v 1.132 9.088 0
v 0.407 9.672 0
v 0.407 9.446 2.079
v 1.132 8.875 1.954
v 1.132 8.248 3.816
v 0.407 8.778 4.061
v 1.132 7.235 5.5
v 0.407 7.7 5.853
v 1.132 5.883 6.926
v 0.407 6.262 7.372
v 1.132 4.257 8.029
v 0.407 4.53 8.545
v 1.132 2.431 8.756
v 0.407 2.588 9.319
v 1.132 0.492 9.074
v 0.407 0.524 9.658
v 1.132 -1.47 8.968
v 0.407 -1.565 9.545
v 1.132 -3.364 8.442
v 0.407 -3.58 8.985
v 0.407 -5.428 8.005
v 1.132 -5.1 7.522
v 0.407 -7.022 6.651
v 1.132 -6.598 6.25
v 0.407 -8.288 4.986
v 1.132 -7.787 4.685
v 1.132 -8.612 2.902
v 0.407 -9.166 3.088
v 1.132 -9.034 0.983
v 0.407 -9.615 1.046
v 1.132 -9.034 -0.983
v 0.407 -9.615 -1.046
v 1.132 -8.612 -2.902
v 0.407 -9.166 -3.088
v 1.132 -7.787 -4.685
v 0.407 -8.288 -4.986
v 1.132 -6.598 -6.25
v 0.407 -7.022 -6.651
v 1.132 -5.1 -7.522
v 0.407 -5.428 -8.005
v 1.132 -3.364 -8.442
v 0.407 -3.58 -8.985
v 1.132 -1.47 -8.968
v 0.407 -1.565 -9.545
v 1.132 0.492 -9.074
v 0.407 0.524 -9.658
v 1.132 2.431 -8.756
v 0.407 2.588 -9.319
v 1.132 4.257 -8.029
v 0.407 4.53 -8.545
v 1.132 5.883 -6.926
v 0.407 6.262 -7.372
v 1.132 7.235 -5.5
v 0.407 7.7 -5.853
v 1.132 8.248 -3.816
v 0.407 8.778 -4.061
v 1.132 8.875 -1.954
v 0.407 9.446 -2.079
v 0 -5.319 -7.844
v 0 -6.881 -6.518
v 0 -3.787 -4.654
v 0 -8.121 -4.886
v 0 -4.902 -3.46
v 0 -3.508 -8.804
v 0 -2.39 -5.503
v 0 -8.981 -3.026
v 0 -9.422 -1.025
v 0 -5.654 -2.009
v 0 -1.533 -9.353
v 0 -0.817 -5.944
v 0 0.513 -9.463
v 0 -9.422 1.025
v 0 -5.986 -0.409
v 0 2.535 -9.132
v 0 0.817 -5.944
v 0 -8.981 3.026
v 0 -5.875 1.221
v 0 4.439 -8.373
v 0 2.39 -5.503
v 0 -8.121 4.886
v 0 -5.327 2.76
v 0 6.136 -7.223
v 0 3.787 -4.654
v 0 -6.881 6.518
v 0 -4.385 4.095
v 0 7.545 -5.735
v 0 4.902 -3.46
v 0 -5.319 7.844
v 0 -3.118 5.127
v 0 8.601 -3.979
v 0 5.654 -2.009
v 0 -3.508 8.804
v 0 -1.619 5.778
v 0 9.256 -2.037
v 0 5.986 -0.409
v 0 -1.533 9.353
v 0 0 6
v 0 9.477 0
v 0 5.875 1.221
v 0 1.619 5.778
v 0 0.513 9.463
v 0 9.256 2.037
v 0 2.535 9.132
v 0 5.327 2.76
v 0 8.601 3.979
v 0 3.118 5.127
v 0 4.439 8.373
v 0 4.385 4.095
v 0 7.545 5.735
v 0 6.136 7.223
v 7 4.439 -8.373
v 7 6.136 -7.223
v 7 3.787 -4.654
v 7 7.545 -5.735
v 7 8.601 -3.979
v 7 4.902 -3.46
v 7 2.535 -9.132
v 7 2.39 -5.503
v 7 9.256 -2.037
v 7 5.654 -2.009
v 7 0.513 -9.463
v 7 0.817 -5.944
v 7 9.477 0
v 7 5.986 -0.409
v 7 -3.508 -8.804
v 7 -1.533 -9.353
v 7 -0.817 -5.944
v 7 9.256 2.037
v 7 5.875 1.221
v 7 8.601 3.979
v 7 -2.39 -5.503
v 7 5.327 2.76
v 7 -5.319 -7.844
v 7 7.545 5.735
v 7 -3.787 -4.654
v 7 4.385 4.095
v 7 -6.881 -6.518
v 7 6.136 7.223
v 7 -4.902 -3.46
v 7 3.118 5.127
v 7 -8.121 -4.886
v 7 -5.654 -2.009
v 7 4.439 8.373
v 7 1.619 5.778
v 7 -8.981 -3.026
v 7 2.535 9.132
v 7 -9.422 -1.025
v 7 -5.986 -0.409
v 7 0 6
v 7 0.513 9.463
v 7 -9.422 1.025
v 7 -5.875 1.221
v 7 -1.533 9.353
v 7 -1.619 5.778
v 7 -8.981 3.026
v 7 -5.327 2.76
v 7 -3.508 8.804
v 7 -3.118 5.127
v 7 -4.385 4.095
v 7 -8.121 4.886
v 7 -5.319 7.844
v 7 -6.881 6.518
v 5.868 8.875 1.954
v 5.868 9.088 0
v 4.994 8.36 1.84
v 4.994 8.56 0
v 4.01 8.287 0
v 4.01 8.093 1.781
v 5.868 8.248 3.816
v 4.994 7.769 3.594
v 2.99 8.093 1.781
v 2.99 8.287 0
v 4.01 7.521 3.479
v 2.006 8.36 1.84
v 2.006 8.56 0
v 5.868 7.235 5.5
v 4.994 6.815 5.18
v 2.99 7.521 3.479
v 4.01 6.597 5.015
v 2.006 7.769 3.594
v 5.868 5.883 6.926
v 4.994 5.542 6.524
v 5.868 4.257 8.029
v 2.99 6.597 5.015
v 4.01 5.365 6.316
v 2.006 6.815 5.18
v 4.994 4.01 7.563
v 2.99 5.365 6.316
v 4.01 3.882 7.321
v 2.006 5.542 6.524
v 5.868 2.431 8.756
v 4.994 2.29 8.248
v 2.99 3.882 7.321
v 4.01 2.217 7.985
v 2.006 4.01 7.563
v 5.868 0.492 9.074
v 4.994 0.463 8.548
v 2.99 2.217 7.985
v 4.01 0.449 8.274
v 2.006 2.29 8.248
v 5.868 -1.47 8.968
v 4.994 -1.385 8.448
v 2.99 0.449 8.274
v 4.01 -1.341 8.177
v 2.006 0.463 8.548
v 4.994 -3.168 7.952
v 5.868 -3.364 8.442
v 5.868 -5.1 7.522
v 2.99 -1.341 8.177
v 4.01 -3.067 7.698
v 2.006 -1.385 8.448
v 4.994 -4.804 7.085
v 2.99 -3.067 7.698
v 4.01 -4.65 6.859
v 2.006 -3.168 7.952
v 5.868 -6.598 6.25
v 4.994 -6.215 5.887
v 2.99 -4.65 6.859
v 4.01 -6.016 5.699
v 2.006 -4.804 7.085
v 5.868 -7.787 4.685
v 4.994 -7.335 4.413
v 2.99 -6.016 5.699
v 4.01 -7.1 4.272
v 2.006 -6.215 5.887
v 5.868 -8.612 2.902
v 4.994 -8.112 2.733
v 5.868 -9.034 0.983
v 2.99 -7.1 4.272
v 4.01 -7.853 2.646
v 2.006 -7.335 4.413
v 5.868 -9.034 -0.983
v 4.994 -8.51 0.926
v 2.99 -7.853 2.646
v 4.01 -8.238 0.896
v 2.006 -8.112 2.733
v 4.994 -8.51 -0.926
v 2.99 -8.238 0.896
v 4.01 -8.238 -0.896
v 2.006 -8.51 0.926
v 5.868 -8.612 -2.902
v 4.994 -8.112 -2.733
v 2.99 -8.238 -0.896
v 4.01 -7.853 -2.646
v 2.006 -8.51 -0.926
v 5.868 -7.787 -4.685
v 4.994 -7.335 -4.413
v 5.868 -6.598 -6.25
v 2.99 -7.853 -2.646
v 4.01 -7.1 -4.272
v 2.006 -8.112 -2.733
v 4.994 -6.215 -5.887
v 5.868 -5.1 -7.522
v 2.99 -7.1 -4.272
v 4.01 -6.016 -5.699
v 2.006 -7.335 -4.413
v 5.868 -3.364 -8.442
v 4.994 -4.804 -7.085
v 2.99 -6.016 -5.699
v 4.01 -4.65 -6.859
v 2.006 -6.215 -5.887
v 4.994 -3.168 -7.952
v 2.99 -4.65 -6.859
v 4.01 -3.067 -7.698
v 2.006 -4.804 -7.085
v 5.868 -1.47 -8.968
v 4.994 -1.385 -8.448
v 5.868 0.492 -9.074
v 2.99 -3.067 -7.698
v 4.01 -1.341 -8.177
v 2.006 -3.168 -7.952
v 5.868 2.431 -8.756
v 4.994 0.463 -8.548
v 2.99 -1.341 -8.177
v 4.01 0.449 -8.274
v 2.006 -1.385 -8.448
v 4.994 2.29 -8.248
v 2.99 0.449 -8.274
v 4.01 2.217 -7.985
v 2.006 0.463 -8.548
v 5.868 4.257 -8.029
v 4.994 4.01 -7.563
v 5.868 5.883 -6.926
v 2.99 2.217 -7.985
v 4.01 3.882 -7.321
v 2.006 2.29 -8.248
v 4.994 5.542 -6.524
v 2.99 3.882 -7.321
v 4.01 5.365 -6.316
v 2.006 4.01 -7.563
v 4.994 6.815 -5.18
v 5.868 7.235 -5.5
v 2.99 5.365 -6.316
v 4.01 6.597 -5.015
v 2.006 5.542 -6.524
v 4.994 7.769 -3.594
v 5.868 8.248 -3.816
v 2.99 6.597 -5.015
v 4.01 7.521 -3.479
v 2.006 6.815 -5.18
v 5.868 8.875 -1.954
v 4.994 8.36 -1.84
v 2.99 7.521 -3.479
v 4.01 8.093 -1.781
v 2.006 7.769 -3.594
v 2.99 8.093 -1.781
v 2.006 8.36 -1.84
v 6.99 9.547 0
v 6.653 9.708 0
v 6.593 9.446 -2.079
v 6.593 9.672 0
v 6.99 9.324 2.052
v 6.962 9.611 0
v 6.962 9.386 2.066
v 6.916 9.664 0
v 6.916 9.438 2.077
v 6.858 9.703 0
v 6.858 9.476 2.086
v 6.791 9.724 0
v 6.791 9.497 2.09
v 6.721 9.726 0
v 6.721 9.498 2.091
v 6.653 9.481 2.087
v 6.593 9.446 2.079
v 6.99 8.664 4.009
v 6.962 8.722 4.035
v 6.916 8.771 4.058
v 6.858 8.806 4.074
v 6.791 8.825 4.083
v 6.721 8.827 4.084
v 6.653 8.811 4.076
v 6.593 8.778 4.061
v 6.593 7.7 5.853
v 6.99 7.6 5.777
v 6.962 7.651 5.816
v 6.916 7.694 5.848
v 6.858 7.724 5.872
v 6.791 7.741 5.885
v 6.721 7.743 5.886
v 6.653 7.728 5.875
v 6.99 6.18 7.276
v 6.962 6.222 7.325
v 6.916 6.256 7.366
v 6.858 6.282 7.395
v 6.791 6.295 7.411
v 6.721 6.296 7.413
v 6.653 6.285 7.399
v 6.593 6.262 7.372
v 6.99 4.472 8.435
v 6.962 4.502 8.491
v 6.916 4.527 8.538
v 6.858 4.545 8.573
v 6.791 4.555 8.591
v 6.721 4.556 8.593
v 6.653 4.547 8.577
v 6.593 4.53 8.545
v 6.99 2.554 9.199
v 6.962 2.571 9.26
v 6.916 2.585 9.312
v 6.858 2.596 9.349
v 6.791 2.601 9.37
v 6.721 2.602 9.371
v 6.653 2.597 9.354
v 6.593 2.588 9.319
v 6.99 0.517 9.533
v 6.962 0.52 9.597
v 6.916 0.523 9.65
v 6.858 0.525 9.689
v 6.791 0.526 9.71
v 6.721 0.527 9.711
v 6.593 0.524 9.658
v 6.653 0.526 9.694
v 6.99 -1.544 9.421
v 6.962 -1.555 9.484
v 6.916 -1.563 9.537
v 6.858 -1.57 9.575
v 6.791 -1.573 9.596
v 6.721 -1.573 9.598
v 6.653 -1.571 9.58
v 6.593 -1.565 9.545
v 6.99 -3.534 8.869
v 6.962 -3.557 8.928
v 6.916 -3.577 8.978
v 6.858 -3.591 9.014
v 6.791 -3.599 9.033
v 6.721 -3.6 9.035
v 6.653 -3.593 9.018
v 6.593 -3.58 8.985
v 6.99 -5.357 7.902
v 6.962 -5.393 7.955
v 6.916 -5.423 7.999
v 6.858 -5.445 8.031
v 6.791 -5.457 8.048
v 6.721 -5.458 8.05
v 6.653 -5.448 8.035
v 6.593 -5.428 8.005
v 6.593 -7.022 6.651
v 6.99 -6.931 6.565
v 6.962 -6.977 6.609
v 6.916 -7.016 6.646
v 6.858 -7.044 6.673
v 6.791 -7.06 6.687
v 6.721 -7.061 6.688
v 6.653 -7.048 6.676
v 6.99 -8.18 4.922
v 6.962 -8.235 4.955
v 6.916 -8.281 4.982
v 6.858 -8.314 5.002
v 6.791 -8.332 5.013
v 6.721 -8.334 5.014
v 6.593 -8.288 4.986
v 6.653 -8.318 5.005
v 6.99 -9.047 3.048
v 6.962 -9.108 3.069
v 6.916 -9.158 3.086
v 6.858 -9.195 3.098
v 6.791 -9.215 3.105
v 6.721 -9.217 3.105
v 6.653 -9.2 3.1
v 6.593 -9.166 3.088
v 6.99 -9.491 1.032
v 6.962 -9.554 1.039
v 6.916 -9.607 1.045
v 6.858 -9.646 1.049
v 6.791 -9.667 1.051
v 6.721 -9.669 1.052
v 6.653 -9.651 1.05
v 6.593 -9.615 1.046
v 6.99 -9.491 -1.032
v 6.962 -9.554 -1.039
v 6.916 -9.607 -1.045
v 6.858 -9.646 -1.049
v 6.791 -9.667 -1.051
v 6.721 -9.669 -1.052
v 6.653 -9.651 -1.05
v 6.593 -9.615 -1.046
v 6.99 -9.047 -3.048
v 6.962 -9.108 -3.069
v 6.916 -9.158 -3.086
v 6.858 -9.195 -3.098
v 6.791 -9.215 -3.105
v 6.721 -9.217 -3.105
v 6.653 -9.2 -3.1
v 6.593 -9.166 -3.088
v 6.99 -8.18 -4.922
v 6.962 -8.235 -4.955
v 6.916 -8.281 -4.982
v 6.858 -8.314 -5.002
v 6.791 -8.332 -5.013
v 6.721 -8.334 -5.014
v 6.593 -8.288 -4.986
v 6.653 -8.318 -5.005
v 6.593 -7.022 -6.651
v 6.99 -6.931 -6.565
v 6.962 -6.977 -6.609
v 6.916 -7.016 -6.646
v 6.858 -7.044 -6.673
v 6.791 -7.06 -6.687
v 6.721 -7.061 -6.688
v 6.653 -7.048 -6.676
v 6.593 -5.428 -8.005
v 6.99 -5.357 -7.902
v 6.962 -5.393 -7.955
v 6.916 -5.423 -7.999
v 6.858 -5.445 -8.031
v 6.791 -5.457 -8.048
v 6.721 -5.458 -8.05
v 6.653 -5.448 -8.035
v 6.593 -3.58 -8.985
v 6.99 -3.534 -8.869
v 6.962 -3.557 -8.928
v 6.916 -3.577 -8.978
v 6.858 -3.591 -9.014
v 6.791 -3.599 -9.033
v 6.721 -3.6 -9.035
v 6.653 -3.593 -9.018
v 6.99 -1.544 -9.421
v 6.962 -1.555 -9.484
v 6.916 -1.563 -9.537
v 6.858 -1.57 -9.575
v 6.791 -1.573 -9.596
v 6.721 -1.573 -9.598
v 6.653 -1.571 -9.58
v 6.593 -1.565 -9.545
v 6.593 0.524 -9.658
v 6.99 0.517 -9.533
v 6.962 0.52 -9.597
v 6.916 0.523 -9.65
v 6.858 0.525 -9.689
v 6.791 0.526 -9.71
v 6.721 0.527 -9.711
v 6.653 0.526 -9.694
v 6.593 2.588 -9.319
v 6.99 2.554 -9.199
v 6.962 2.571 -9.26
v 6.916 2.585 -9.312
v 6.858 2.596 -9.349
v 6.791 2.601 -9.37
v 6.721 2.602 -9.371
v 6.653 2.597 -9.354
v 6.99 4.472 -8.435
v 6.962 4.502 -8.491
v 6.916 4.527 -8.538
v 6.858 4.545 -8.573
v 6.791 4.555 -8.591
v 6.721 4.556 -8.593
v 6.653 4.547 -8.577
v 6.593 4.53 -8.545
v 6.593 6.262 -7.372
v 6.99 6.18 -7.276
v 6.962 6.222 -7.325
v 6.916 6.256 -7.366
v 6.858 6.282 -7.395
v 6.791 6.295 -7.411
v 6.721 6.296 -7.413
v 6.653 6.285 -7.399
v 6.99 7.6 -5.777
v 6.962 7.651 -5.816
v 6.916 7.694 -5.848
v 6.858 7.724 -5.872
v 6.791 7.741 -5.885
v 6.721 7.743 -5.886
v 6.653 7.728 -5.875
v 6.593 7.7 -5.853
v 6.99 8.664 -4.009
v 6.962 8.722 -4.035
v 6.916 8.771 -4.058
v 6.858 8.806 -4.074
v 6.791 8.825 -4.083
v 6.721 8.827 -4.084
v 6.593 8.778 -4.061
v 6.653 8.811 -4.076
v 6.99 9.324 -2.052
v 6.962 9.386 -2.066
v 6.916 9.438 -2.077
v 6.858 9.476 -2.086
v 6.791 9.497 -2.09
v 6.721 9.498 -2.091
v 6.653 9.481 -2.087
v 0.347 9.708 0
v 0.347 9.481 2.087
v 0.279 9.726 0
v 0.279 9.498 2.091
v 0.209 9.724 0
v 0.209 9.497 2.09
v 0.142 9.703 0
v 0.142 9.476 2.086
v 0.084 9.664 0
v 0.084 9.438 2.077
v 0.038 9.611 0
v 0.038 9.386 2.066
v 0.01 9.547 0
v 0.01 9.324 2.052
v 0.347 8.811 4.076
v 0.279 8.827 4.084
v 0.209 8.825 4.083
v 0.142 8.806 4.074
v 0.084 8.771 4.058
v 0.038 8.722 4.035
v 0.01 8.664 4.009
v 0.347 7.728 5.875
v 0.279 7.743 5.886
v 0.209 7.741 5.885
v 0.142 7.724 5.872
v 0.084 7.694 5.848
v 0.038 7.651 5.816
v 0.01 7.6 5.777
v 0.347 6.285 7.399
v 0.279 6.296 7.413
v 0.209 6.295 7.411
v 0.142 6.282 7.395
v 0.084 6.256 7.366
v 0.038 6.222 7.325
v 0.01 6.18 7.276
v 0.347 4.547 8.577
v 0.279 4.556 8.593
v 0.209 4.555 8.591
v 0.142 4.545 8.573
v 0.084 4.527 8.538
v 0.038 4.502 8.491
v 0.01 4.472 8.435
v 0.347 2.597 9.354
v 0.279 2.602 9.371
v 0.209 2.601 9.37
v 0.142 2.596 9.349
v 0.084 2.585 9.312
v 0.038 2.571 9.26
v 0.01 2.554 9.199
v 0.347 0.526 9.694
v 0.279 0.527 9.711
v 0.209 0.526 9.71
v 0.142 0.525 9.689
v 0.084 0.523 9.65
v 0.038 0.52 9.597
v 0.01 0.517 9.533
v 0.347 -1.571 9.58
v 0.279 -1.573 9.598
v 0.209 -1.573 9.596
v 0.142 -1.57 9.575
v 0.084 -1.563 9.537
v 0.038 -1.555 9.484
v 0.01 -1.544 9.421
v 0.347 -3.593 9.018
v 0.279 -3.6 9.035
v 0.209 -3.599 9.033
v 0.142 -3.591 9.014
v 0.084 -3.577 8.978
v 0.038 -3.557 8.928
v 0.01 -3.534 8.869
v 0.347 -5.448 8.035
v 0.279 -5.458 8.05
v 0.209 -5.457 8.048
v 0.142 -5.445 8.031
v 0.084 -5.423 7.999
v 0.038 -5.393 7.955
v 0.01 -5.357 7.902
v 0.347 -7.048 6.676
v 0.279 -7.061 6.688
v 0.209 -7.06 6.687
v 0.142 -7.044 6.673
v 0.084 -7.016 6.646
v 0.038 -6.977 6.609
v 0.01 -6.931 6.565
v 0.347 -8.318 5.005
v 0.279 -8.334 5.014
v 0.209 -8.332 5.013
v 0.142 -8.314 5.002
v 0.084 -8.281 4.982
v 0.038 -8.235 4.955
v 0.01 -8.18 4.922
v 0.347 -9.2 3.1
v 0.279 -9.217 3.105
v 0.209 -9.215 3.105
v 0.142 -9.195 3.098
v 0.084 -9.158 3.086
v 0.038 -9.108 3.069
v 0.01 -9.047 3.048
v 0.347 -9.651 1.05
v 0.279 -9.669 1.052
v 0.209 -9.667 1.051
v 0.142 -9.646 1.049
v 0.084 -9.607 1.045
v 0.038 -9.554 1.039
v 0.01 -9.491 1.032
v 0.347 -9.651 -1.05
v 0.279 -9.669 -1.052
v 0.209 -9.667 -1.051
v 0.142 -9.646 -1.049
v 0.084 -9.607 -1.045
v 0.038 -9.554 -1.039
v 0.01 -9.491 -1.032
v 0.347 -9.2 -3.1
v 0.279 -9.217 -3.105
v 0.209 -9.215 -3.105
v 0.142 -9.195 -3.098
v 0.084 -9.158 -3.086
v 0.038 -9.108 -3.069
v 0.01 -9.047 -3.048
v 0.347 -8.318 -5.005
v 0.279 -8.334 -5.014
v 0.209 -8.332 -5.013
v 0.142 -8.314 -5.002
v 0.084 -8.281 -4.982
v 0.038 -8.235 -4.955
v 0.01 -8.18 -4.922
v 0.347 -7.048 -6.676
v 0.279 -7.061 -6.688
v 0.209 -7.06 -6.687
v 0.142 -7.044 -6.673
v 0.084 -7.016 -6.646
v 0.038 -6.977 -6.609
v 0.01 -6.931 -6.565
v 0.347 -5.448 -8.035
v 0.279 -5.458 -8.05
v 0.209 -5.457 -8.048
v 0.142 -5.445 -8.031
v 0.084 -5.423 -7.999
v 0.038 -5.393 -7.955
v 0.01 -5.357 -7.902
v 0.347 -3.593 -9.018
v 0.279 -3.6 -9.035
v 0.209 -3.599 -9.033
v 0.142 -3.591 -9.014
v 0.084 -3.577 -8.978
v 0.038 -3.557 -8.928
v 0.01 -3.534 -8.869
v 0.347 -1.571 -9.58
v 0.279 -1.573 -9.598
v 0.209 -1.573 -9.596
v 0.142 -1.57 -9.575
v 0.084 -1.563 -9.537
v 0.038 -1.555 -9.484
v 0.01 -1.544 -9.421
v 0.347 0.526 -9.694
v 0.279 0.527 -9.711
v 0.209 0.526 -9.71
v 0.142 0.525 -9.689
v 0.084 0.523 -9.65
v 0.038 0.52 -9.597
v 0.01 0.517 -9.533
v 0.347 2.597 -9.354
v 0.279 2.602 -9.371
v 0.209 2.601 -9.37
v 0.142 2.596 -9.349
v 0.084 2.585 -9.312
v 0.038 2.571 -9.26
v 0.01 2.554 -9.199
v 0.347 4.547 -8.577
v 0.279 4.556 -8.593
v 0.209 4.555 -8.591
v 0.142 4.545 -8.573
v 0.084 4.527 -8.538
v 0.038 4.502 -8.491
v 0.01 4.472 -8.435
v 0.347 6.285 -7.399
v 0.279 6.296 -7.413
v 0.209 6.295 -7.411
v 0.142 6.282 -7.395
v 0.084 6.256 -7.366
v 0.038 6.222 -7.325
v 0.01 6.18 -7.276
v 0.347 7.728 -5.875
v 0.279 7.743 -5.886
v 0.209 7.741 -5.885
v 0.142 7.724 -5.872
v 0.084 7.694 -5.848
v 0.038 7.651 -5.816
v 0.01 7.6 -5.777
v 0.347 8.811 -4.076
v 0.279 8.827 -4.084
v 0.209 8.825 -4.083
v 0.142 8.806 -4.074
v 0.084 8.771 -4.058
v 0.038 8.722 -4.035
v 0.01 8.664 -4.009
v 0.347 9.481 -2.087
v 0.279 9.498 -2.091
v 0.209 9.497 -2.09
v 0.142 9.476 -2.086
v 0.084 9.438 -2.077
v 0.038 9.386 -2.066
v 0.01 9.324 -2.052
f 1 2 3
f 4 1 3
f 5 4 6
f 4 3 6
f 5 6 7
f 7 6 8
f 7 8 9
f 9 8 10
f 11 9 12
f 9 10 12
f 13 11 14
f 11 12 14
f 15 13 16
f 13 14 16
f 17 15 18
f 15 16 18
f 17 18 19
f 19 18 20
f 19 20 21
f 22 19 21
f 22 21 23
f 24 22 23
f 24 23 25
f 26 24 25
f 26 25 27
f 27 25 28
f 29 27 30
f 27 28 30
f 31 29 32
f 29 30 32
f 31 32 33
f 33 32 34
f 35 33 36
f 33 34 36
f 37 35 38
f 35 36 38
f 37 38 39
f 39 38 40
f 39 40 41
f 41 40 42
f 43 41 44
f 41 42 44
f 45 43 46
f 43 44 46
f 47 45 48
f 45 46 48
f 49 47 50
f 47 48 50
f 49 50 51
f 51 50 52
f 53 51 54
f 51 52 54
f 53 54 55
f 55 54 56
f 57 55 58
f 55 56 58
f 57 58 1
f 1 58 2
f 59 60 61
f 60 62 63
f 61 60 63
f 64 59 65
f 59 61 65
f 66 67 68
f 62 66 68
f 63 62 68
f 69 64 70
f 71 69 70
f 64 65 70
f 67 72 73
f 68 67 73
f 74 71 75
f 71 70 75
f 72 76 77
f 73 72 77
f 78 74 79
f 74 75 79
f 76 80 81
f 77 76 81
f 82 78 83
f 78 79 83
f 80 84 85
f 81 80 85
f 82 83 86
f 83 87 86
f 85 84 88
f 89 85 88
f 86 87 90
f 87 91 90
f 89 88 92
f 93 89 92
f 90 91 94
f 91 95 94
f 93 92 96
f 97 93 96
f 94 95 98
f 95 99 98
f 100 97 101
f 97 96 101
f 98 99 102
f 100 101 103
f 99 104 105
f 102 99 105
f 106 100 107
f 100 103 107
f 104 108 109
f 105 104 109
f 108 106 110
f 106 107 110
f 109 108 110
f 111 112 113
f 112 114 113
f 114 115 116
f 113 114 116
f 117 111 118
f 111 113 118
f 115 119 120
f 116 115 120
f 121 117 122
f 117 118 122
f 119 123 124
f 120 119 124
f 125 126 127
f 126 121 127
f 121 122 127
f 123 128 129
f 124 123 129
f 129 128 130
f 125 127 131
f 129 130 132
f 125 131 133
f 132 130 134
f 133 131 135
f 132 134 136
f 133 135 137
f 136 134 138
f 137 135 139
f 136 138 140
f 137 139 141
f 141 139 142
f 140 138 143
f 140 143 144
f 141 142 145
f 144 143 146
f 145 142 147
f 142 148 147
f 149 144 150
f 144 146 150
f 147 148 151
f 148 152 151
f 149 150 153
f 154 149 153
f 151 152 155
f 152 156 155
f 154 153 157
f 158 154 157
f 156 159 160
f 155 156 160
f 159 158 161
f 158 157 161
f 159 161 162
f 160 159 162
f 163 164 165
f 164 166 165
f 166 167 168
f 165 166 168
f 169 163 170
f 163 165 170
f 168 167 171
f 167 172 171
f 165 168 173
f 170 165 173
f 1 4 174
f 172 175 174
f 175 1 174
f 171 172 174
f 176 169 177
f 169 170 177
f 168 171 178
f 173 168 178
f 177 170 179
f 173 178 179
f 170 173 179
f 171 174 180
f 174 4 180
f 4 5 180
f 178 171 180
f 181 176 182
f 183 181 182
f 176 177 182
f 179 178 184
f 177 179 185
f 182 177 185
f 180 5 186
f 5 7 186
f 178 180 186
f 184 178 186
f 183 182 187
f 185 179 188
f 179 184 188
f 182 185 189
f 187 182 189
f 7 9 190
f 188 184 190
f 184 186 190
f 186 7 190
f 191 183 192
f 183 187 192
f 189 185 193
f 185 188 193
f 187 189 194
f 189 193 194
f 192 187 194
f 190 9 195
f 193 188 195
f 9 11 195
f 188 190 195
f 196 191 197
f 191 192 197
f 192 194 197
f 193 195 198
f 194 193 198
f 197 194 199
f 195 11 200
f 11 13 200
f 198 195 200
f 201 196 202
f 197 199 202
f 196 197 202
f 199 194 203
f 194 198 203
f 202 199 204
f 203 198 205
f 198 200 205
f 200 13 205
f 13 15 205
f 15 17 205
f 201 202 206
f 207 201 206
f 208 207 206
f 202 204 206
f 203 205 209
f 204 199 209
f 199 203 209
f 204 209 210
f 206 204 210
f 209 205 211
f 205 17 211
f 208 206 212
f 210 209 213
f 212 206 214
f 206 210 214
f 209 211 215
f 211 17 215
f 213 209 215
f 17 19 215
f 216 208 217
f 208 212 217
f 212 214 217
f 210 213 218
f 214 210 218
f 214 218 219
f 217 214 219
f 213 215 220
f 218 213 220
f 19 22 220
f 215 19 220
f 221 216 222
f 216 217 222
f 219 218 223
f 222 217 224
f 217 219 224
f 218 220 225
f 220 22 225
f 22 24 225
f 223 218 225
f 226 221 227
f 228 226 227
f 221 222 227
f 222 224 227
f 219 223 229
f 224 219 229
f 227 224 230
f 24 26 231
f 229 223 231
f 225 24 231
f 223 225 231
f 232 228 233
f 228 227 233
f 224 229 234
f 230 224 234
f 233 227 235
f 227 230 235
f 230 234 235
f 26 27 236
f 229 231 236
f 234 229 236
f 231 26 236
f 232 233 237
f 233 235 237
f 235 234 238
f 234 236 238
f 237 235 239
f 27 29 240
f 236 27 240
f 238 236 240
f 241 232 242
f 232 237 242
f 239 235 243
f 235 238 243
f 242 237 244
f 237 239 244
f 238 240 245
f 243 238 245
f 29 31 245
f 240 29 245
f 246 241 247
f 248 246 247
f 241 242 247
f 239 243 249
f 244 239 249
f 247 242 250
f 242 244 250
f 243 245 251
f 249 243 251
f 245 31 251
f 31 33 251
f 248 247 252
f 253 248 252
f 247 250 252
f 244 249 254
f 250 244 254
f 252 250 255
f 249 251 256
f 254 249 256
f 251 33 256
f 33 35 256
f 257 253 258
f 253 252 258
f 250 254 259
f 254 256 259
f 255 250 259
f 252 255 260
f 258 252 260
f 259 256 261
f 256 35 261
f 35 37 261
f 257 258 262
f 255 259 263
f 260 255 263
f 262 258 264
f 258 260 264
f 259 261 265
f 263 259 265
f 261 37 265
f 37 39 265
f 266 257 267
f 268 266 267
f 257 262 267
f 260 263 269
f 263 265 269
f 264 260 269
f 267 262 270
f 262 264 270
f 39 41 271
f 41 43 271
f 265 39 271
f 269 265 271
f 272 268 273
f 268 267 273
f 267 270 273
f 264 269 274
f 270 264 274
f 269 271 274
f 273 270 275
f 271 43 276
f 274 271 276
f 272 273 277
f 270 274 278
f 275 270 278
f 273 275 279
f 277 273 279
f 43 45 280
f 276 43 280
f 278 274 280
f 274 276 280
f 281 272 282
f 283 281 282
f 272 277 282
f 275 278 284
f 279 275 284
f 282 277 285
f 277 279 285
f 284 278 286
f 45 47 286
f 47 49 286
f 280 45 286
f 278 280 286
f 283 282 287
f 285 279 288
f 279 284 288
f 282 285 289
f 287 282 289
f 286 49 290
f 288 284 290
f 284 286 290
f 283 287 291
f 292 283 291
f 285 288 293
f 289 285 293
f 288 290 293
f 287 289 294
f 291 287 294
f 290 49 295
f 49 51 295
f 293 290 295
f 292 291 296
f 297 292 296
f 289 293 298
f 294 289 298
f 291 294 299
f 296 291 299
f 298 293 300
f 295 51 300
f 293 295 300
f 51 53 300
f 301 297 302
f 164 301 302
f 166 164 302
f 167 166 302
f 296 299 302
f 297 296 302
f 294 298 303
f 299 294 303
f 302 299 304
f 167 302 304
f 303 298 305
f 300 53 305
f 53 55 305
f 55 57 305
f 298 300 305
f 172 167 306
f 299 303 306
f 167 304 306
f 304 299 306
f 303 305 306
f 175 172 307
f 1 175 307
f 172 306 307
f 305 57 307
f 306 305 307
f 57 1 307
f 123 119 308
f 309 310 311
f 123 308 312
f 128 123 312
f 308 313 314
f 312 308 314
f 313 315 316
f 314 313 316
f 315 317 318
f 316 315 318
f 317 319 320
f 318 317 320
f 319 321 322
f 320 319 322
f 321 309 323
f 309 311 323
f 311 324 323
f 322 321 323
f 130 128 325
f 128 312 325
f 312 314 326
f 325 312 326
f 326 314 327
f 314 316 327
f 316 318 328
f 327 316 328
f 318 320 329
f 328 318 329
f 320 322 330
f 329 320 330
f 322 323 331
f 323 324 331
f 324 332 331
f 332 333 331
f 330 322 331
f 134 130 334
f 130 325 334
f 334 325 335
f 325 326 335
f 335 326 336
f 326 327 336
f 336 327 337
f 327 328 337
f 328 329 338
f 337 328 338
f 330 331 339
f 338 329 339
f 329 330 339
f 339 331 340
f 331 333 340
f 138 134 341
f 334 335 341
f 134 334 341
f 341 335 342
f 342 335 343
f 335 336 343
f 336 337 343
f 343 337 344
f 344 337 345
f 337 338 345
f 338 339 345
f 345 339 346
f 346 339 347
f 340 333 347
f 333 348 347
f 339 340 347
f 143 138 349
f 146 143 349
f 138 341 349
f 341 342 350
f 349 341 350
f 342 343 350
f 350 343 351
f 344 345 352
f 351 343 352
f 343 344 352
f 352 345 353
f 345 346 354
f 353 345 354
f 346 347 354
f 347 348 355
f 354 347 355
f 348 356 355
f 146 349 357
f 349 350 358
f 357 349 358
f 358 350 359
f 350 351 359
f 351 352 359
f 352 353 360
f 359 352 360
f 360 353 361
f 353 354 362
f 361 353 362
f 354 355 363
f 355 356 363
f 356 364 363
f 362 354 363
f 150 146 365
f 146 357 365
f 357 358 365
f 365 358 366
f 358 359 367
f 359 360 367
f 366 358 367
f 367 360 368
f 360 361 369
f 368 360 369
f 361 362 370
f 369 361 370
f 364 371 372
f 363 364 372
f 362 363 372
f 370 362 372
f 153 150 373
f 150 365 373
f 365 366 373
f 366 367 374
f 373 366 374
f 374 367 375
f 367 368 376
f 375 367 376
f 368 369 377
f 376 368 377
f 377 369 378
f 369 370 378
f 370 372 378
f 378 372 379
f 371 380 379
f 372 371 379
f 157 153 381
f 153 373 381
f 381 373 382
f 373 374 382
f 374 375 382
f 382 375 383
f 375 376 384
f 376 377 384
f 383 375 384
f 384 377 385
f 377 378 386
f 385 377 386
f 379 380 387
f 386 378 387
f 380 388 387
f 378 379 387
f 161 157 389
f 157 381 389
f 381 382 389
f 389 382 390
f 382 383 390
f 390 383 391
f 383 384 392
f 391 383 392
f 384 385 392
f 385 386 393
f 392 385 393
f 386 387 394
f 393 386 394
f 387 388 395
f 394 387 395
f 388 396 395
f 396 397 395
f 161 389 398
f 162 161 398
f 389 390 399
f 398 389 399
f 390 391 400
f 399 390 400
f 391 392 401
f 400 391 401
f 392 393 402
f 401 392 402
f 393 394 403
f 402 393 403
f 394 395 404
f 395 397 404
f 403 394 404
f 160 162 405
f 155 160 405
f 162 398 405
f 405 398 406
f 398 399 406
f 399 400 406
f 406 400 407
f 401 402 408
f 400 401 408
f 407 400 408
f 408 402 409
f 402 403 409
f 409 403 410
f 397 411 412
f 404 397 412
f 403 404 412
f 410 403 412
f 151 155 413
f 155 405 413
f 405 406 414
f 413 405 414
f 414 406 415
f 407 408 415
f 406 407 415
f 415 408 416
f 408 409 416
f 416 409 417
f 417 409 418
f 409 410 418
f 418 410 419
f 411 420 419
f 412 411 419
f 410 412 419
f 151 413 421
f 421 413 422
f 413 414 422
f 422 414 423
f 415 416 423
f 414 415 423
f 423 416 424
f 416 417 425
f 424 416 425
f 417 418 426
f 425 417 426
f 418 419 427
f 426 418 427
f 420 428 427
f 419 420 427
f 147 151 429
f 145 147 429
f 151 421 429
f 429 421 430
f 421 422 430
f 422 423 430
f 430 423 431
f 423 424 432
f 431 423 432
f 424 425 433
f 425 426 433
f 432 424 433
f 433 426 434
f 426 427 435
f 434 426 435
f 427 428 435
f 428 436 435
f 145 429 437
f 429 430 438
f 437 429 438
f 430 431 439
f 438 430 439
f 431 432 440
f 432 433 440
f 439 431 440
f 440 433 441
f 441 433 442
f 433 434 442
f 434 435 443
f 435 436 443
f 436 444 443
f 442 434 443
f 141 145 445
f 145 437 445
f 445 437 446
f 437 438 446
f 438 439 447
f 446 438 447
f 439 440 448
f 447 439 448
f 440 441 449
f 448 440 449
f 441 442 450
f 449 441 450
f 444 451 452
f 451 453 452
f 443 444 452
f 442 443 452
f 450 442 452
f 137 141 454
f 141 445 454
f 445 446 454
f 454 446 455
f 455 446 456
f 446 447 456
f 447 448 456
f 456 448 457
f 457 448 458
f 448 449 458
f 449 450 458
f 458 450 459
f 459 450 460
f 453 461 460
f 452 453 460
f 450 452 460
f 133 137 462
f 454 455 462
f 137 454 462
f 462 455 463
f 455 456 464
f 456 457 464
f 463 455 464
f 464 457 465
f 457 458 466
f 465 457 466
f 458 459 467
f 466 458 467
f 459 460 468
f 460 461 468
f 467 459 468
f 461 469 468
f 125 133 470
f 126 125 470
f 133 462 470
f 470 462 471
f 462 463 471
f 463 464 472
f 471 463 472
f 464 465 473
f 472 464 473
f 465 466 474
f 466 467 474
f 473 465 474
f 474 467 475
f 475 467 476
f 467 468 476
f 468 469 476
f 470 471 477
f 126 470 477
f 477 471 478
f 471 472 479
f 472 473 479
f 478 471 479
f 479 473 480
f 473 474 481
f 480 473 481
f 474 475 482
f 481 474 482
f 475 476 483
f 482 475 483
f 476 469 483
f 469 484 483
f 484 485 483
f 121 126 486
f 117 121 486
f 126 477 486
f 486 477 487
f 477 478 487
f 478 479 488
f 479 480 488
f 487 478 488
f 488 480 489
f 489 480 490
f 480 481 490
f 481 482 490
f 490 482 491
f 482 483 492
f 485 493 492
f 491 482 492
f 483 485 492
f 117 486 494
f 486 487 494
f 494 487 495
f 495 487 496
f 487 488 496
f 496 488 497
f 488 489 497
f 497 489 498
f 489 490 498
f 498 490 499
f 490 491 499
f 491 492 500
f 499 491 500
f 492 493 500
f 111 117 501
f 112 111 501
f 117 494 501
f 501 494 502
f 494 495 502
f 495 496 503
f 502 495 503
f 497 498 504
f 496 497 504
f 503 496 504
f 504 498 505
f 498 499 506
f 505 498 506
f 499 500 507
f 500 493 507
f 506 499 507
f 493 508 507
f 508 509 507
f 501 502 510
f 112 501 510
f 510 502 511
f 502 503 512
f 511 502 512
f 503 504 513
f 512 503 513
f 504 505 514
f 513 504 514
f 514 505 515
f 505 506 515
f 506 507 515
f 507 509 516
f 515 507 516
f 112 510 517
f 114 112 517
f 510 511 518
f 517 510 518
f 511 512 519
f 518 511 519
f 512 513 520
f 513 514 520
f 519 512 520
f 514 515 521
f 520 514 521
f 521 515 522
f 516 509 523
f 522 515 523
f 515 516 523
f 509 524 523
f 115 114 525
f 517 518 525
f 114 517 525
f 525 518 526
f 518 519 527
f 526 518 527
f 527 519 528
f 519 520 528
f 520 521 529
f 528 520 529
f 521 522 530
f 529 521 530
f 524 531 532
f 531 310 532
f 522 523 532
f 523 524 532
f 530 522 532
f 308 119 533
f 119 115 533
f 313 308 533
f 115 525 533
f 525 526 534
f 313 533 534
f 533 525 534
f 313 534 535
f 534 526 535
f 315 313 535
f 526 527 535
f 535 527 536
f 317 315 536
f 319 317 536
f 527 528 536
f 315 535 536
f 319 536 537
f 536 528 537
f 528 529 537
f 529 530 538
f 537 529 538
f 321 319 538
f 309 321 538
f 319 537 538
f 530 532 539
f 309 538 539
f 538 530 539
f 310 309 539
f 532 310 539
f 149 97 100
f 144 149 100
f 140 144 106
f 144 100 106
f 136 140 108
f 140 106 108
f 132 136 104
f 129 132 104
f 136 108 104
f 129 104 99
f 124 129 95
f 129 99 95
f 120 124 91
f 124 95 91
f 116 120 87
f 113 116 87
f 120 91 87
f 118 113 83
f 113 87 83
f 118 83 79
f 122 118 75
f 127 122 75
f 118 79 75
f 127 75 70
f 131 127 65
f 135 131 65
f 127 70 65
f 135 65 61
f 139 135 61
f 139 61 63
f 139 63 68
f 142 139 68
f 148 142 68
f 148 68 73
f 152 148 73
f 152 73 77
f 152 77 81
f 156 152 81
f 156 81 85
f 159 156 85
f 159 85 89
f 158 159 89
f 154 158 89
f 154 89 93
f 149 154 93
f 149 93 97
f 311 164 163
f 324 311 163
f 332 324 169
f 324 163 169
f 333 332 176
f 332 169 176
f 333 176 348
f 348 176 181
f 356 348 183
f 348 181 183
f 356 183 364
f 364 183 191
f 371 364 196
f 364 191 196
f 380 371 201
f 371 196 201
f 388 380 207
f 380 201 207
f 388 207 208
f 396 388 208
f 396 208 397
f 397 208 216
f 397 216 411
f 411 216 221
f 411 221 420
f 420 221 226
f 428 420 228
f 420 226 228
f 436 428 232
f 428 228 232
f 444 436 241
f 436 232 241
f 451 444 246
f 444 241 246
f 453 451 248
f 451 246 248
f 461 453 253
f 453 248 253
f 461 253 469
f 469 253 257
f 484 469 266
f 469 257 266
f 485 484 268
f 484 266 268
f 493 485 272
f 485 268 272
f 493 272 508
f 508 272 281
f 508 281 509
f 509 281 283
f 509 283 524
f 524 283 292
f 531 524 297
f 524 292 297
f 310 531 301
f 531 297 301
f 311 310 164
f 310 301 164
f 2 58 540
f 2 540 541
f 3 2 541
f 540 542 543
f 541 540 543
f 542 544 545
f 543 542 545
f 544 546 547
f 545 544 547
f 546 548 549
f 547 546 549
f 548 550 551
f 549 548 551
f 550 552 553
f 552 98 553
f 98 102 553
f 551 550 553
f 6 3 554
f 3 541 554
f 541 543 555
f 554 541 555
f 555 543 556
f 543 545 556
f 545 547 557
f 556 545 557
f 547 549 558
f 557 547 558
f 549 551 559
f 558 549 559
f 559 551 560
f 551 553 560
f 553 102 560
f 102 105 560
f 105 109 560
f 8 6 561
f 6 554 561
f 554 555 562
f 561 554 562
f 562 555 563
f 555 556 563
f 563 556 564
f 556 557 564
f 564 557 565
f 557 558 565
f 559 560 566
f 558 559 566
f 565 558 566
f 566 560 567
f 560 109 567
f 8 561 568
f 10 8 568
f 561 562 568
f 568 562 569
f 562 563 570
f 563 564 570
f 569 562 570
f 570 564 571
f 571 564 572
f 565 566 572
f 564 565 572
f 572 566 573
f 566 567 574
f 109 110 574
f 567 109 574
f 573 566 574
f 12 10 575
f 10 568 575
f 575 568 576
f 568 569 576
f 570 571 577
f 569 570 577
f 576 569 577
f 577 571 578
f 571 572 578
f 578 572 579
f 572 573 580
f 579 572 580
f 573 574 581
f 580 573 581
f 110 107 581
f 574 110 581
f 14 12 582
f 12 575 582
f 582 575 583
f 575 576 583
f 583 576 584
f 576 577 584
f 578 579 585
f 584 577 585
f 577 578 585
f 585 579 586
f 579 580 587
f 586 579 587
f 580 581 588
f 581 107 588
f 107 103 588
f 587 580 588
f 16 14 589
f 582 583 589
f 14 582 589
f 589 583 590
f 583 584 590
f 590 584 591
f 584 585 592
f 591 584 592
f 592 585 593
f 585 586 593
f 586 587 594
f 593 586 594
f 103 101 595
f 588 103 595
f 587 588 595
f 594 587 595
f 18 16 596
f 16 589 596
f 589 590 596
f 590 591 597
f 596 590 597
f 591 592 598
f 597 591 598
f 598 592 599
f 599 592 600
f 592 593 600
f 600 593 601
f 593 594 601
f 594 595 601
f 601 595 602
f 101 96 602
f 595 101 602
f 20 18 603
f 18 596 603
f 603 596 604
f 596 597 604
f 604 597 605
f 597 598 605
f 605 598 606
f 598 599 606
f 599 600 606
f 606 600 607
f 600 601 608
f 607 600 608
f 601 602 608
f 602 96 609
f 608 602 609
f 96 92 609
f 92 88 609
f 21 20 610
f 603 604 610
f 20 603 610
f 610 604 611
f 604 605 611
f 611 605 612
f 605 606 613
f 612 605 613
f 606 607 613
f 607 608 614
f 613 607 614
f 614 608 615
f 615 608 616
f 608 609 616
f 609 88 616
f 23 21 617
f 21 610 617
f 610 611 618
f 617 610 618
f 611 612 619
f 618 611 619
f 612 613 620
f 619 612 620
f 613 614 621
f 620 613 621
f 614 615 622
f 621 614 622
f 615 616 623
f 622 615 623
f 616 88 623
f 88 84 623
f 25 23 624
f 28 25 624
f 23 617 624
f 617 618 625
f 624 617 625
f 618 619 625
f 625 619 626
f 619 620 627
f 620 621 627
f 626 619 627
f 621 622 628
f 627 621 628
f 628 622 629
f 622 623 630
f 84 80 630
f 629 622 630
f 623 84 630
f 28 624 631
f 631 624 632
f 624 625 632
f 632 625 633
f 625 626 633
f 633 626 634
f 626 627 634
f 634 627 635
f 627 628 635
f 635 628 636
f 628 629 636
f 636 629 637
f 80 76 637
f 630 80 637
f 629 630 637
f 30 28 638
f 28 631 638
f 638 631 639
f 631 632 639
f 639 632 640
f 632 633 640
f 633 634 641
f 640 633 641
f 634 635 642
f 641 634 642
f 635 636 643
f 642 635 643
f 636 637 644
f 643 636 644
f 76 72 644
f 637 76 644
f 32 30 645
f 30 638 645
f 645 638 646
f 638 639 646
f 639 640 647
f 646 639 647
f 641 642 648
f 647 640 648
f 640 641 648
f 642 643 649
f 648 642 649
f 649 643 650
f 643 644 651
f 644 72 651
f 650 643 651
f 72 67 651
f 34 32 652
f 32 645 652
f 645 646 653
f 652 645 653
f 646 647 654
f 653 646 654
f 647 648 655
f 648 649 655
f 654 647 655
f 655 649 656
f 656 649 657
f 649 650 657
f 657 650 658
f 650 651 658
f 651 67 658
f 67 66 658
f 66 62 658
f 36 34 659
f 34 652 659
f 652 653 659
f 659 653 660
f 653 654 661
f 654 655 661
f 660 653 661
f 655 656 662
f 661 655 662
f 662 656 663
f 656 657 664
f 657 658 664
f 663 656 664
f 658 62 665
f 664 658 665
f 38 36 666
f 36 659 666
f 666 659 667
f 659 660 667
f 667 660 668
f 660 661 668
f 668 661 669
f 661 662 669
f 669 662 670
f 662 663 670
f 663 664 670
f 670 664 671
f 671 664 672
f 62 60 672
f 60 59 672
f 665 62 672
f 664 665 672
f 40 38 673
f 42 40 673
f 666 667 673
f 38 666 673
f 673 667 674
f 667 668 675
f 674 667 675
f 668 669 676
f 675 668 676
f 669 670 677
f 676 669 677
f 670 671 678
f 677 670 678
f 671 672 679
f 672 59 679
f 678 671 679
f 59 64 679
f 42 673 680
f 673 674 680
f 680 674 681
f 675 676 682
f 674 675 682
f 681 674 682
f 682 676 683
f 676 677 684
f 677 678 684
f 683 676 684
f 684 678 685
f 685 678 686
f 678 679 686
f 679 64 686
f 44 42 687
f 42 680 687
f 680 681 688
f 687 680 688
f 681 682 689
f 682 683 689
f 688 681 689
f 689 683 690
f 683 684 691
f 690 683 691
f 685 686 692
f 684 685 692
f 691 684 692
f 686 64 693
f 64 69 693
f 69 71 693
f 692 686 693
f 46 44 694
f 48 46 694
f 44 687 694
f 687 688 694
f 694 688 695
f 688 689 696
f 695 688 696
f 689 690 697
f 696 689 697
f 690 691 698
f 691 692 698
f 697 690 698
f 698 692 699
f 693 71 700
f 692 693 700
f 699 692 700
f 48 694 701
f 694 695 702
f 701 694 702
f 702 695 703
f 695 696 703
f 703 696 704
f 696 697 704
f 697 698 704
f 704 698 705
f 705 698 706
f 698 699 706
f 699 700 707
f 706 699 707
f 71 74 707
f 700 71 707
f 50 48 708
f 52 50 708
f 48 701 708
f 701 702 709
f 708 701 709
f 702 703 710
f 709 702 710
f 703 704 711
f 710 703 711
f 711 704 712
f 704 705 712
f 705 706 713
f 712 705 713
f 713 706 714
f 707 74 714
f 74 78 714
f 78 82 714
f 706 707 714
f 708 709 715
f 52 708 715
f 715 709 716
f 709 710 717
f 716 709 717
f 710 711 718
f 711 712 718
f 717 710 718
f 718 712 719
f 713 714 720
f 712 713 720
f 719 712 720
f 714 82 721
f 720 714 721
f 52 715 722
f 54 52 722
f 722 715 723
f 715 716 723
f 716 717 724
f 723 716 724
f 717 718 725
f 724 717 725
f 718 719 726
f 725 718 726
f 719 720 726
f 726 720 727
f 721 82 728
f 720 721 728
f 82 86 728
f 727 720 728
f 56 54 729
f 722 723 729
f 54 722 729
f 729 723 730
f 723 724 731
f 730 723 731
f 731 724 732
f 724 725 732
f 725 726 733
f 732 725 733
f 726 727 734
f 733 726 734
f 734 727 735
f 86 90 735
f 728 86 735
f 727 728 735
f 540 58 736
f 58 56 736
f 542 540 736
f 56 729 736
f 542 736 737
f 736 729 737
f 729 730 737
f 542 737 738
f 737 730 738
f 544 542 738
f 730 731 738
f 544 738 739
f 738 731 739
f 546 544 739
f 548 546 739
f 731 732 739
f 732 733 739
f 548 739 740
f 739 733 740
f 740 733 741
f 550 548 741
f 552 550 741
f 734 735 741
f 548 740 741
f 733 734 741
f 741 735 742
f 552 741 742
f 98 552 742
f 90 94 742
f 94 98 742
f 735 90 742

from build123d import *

# Parameters (mm, degrees)
FILLET1_R          = 0.25
CUT_EXTRUDE1_REACH = 9
SKETCH3_R          = 6


with BuildPart() as part:
    # Sketch2 → Revolve1 (revolve)
    with BuildSketch(Plane.XY):
        with BuildLine():
            Line((0, 0), (7, 0))
            Line((7, 0), (7, 10))
            Line((7, 10), (5.868174923, 9.087607037))
            ThreePointArc((5.868174923, 9.087607037), (3.5, 8.251940939), (1.131825077, 9.087607037))
            Line((1.131825077, 9.087607037), (0, 10))
            Line((0, 10), (0, 0))
        make_face()
    revolve(axis=Axis((0, 0, 0), (1, 0, 0)))

    # Fillet1
    fillet1_edges = [part.edges().sort_by_distance(p)[0] for p in [
        (0, -10, 0),
        (7, -10, 0),
    ]]
    fillet(fillet1_edges, radius=FILLET1_R)

    # Sketch3 → Cut-Extrude1 (cut, up to next)
    with BuildSketch(Plane.ZY, mode=Mode.PRIVATE) as cut_extrude1_sk1:
        Circle(SKETCH3_R)
    cut_extrude1_tool1 = extrude(cut_extrude1_sk1.sketch, amount=-CUT_EXTRUDE1_REACH, mode=Mode.PRIVATE) & part.part
    add(cut_extrude1_tool1.solids().sort_by_distance((0, 0, 0))[0], mode=Mode.SUBTRACT)


solid = part.part
